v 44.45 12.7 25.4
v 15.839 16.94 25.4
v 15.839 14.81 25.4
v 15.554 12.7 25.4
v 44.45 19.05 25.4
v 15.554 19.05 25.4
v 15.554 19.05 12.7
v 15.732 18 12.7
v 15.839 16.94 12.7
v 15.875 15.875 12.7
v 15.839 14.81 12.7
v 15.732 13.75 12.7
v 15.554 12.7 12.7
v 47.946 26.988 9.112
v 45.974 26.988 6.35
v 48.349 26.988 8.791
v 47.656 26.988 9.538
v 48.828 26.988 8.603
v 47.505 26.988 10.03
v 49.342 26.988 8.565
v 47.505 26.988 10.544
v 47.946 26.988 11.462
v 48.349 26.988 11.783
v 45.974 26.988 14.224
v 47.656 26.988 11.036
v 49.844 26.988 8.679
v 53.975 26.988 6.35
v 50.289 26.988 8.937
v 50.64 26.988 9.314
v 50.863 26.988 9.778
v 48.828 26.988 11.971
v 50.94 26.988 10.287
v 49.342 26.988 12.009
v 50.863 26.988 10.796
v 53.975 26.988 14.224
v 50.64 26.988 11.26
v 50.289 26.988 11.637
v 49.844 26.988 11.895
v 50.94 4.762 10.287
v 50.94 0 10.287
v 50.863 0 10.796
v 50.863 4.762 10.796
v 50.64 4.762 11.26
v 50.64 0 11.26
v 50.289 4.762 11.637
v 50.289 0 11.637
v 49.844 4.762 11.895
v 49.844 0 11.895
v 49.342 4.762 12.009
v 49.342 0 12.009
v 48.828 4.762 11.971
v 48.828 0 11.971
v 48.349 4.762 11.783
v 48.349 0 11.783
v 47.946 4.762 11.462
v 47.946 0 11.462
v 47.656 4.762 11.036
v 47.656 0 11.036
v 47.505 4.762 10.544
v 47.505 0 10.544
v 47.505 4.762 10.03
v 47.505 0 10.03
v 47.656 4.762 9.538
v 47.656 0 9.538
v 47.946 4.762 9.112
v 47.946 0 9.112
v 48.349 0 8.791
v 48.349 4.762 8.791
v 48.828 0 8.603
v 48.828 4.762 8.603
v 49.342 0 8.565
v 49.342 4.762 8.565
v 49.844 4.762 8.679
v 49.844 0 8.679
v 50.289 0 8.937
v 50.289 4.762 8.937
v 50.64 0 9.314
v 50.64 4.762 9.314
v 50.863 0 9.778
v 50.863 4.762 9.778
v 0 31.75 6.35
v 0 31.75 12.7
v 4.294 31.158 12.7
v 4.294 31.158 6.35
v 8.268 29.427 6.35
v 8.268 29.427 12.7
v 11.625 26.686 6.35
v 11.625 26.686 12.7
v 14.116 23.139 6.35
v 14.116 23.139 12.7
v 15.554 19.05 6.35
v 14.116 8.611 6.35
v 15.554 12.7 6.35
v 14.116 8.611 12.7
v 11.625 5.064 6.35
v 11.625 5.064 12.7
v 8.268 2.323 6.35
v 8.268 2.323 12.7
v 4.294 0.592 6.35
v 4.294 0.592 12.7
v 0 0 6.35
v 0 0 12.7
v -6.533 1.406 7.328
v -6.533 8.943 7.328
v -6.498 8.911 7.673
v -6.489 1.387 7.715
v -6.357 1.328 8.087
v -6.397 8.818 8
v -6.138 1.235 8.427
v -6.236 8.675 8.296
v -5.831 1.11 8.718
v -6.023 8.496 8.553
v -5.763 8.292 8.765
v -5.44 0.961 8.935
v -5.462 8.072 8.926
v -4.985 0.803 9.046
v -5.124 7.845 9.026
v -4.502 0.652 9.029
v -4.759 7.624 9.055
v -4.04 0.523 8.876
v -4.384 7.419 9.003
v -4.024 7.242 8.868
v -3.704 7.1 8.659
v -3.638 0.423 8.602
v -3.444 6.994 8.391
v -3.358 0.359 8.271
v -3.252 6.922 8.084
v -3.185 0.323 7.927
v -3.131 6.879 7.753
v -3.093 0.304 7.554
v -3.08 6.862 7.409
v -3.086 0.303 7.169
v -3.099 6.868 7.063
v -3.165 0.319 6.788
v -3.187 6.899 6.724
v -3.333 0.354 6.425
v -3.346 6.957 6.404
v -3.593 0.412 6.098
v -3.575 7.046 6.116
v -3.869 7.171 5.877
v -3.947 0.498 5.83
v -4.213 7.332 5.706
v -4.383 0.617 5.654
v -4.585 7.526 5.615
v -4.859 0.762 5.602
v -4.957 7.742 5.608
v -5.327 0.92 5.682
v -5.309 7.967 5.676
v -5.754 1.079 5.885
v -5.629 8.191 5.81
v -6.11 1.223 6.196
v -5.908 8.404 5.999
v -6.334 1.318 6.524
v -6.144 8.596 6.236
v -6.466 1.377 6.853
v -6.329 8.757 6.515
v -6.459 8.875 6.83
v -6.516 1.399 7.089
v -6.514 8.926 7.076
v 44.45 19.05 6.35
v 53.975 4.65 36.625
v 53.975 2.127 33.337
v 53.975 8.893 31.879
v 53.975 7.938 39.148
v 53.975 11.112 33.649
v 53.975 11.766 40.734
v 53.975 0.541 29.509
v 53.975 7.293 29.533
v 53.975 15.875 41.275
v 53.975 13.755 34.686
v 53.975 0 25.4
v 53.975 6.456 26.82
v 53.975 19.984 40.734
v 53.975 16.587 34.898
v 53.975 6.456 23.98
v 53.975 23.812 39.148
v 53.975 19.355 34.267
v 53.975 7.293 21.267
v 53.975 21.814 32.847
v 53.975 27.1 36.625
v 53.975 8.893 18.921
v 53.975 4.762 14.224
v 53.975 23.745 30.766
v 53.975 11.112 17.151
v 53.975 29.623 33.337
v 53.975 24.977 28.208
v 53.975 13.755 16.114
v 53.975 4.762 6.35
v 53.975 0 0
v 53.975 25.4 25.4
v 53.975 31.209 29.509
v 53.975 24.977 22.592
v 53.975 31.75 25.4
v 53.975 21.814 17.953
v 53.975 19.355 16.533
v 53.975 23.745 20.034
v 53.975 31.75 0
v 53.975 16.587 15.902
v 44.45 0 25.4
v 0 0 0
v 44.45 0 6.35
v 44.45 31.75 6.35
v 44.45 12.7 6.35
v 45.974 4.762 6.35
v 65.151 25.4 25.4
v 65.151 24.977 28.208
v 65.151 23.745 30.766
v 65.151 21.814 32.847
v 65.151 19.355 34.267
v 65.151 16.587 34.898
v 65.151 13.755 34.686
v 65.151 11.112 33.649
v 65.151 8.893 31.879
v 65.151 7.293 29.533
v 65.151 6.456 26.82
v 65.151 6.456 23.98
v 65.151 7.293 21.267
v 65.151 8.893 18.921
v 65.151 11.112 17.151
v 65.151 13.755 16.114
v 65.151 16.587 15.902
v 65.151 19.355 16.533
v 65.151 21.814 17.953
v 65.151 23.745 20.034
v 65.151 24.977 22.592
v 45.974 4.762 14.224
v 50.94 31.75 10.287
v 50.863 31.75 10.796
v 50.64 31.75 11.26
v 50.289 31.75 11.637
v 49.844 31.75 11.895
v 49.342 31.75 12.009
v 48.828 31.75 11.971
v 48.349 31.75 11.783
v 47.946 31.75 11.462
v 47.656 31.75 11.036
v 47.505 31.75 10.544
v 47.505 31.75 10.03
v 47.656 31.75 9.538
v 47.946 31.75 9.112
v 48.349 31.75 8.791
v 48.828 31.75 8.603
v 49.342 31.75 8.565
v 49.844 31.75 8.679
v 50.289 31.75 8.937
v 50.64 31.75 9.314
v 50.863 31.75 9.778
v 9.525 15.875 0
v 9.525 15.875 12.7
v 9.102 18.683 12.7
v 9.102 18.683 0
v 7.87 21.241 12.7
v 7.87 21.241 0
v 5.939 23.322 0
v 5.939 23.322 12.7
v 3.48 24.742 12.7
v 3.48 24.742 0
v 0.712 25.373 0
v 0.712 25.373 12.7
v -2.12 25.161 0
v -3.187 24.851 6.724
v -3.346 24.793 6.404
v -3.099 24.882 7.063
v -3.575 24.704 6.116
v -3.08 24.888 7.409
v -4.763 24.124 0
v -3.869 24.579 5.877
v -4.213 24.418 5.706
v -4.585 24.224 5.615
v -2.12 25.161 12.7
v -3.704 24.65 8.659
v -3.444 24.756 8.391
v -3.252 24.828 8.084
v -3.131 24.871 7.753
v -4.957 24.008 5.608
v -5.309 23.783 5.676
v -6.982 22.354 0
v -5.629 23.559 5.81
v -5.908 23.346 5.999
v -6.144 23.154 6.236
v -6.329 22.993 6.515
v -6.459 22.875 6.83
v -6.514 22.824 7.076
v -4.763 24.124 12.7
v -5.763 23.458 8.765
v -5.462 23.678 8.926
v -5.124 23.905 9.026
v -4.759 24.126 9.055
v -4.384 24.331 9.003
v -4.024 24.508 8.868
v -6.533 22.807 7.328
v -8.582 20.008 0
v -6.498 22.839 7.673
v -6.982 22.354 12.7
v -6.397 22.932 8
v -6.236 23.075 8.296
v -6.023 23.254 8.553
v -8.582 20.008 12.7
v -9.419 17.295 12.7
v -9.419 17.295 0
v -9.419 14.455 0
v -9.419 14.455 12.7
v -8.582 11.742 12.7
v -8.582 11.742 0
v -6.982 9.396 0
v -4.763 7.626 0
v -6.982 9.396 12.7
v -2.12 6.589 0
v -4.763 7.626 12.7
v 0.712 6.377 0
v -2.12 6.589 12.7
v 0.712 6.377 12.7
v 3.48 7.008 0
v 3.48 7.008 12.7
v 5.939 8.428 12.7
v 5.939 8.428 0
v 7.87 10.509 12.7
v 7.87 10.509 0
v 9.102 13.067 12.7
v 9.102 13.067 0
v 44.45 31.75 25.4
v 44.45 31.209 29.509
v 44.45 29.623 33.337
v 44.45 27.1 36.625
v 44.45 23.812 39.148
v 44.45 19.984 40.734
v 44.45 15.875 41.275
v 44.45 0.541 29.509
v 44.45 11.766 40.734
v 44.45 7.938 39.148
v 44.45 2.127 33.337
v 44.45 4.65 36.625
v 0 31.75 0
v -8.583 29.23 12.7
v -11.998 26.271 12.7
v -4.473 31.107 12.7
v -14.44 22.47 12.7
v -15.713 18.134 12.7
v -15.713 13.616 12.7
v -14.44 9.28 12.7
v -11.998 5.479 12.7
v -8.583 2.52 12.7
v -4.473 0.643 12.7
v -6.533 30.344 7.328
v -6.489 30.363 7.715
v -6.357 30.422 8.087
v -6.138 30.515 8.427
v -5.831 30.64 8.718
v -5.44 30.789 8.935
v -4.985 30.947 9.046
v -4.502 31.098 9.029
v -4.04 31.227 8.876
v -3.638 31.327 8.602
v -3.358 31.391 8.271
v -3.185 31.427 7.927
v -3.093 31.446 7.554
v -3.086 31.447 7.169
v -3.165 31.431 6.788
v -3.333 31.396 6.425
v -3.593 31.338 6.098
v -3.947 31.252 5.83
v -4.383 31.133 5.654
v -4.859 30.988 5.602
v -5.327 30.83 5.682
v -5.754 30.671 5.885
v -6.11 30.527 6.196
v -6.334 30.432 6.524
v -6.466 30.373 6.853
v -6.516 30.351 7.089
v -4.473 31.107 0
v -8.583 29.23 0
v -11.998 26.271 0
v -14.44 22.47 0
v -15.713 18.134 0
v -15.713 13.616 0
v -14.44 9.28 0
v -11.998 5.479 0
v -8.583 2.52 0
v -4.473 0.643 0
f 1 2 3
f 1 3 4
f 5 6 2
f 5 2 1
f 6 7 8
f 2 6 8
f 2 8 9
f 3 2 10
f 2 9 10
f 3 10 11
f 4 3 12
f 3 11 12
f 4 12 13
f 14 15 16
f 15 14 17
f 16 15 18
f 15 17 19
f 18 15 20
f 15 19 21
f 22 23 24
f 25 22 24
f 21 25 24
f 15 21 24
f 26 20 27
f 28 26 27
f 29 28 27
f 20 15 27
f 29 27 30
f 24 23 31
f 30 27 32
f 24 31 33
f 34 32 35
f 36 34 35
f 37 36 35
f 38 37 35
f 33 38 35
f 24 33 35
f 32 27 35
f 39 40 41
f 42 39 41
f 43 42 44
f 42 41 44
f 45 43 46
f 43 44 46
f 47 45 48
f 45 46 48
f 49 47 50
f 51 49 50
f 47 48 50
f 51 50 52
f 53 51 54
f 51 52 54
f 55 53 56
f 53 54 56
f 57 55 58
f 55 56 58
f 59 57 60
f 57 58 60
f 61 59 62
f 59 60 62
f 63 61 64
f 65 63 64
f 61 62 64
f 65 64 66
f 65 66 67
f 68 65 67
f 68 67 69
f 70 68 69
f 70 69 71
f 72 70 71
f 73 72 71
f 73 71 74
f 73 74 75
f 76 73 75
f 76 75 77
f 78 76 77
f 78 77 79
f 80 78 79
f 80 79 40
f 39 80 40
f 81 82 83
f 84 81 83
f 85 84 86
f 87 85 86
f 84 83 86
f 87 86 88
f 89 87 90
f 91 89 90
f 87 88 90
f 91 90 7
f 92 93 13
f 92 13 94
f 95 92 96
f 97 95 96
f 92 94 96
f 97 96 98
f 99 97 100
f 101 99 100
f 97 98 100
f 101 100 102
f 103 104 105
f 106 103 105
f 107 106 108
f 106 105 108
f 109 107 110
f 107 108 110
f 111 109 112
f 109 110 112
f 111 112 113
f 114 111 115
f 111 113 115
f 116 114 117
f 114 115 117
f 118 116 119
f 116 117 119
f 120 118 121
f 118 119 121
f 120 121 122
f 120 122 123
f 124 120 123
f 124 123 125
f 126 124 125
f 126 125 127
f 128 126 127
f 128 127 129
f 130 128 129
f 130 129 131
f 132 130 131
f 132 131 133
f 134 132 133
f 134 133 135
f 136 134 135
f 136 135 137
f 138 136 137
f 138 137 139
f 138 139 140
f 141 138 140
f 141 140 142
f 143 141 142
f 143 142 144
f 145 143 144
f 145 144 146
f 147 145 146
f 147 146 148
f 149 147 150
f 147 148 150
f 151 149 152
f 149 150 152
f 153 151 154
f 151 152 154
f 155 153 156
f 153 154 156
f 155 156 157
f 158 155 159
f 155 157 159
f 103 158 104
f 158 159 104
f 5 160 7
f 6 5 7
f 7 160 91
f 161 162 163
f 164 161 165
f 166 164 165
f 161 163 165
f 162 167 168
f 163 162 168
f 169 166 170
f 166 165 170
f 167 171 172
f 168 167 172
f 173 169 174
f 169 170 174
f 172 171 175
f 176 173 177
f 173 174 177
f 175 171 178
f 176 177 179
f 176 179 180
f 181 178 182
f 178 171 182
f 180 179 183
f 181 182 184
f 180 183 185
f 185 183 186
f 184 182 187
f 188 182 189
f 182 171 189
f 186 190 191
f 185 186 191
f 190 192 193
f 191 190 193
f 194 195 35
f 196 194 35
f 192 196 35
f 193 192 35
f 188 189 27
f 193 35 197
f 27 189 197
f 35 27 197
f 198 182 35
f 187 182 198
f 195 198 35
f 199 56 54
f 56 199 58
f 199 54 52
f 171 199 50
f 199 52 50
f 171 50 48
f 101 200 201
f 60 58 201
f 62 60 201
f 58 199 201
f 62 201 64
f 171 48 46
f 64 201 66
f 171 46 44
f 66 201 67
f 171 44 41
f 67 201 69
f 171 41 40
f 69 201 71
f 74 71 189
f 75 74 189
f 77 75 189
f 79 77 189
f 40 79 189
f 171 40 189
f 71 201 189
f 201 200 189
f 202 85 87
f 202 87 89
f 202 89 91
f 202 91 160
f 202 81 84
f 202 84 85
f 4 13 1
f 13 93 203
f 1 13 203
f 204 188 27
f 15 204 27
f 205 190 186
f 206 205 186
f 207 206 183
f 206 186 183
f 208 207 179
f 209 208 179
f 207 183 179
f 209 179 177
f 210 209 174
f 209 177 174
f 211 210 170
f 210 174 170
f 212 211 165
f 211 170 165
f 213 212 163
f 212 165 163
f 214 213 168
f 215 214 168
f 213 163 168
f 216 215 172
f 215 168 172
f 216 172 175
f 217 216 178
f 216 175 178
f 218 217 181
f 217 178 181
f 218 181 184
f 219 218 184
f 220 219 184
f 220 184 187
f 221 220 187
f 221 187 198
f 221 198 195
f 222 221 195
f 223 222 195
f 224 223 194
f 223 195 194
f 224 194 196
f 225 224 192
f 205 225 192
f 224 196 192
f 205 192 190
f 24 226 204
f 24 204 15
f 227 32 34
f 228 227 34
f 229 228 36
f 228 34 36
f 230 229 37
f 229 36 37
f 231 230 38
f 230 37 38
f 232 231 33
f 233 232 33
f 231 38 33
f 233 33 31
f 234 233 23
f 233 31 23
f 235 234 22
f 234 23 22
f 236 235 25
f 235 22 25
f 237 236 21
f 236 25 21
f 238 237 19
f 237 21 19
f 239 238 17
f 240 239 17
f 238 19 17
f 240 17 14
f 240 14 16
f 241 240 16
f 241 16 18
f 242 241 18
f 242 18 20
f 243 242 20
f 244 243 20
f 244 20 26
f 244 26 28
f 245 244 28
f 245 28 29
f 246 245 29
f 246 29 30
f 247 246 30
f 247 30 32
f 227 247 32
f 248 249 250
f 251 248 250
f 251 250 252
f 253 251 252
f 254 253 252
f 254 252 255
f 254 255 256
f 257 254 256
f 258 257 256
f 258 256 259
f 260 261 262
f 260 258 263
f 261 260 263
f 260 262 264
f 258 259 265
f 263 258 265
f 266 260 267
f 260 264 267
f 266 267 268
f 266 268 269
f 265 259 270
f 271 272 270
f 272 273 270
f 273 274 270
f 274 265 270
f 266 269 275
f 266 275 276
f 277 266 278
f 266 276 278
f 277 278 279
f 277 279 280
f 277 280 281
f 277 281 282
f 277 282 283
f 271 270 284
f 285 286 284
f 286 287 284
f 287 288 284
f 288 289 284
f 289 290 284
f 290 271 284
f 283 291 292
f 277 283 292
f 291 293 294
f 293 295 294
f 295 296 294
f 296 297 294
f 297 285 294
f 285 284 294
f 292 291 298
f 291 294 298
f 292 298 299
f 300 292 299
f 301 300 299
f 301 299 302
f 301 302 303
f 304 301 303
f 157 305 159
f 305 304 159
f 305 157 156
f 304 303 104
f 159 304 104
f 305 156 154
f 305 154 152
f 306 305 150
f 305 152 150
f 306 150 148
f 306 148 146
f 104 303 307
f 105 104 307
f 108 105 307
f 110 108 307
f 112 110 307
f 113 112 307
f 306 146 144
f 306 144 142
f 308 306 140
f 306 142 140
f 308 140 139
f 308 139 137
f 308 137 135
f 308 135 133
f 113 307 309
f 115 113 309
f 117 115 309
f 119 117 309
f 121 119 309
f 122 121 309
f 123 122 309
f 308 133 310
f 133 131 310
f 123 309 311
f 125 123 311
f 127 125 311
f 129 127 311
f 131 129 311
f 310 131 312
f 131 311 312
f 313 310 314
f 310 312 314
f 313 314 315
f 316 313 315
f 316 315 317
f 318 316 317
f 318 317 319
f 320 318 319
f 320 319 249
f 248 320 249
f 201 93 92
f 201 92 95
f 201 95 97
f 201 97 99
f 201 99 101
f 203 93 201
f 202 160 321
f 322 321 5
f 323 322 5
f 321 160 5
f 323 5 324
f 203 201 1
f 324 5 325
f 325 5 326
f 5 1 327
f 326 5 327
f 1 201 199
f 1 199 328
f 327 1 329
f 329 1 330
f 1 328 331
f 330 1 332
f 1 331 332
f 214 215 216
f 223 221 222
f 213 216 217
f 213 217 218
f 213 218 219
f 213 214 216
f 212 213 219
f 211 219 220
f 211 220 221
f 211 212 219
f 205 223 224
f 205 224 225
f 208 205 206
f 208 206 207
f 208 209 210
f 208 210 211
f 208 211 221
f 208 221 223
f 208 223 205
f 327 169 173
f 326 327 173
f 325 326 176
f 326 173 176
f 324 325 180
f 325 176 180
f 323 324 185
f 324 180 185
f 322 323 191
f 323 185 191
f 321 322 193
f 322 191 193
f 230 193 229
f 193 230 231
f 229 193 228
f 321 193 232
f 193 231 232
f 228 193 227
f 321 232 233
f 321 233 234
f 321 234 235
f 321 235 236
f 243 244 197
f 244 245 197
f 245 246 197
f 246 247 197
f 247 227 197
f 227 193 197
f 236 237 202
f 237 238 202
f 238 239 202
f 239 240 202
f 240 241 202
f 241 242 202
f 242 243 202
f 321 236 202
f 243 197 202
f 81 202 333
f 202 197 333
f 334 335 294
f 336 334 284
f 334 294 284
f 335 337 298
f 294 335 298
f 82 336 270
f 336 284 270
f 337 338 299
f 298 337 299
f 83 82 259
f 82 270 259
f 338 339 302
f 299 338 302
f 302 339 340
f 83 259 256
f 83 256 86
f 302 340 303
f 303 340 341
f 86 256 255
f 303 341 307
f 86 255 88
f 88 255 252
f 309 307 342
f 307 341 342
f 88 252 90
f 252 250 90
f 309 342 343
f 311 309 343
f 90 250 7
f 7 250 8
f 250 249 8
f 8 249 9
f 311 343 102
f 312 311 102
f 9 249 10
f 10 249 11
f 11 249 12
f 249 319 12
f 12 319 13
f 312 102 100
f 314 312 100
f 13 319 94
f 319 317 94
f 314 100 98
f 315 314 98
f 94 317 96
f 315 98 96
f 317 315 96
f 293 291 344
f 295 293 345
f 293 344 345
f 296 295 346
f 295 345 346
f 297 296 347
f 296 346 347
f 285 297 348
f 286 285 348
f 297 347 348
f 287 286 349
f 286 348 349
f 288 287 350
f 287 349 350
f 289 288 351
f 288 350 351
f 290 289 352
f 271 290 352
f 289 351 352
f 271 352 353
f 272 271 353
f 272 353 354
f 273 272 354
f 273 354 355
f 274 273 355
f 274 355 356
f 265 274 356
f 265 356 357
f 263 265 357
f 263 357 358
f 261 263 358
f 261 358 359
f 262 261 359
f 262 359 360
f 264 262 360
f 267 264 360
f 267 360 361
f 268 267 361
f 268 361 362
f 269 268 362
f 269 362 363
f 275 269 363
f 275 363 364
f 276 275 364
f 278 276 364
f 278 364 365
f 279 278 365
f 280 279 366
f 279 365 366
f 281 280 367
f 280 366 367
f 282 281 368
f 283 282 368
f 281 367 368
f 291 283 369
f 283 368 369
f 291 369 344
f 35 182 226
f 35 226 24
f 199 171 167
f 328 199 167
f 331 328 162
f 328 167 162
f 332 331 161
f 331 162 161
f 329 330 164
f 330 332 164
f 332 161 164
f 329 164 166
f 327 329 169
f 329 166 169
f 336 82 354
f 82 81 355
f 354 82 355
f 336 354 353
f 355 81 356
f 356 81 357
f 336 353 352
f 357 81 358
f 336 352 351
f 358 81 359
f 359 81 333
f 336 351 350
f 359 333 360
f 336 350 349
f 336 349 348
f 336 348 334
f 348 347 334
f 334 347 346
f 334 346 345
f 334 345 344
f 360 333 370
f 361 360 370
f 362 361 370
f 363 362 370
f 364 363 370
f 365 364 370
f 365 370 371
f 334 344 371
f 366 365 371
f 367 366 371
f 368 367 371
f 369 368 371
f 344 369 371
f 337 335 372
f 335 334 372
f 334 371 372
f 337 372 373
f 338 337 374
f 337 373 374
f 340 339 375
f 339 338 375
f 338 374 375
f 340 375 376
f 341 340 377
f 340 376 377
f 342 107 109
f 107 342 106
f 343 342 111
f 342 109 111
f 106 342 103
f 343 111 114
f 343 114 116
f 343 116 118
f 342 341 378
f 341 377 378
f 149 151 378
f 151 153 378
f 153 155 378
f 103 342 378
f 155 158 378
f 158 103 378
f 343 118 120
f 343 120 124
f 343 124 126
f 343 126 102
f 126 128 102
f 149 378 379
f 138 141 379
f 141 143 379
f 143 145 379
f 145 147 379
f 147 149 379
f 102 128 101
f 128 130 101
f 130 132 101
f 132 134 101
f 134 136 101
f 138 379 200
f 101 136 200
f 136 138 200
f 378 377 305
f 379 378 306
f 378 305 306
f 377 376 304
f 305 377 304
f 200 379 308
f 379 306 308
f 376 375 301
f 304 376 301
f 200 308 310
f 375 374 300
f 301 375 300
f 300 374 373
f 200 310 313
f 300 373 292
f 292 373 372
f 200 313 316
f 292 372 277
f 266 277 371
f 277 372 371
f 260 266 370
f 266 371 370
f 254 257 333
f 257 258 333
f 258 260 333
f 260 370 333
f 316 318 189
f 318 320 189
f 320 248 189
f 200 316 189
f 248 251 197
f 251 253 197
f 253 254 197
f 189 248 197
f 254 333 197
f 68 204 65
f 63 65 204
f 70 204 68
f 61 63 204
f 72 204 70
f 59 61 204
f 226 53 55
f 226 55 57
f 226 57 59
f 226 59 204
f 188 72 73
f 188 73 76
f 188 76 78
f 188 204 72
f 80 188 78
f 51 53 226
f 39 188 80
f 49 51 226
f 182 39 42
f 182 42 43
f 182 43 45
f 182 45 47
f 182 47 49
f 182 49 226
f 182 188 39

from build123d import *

# Parameters (mm, degrees)
F1_DEPTH  = 41.275
F3_DEPTH  = 31.751
F5_DEPTH  = 69.851
F6_W      = 22.225
F6_H      = 7.874
F7_DEPTH  = 8.001
F8_R      = 9.525
F9_DEPTH  = 11.176
F10_R     = 1.7272
F11_DEPTH = 31.751
F13_DEPTH = 6.35
F14_R     = 9.525
F15_DEPTH = 12.701
F17_DEPTH = 25.4
F18_R     = 1.7272
F19_DEPTH = 31.751


with BuildPart() as f1:
    # F0 (on Top) → F1 (new body)
    with BuildSketch(Plane.XY):
        with BuildLine():
            ThreePointArc((0, 31.75), (-15.875, 15.875), (0, 0))
            Line((0, 0), (53.975, 0))
            Line((53.975, 0), (53.975, 31.75))
            Line((53.975, 31.75), (0, 31.75))
        make_face()
    extrude(amount=F1_DEPTH)

    # F2 (on face) → F3 (cut, through all)
    with BuildSketch(Plane.XZ):
        Polygon((44.45, 6.35), (44.45, 41.275), (-15.875, 41.275), (-15.875, 12.7), (15.875, 12.7), (15.875, 6.35), align=None)
    extrude(amount=-F3_DEPTH, mode=Mode.SUBTRACT)

    # F4 (on face) → F5 (cut, through all)
    with BuildSketch(Plane.YZ.offset(53.975)):
        with BuildLine():
            ThreePointArc((0, 25.4), (4.6496798487, 36.6253201513), (15.875, 41.275))
            Line((15.875, 41.275), (0, 41.275))
            Line((0, 41.275), (0, 25.4))
        make_face()
        with BuildLine():
            ThreePointArc((15.875, 41.275), (27.1003201513, 36.6253201513), (31.75, 25.4))
            Line((31.75, 25.4), (31.75, 41.275))
            Line((31.75, 41.275), (15.875, 41.275))
        make_face()
    extrude(amount=-F5_DEPTH, mode=Mode.SUBTRACT)

    # F6 (on face) → F7 (cut)
    with BuildSketch(Plane.YZ.offset(53.975)):
        with Locations((15.875, 10.287)):
            Rectangle(F6_W, F6_H)
    extrude(amount=-F7_DEPTH, mode=Mode.SUBTRACT)

    # F8 (on face) → F9 (join)
    with BuildSketch(Plane.YZ.offset(53.975)):
        with Locations((15.875, 25.4)):
            Circle(F8_R)
    extrude(amount=F9_DEPTH)

    # F10 (on face) → F11 (cut, through all)
    with BuildSketch(Plane.XZ):
        with Locations((49.2125, 10.287)):
            Circle(F10_R)
    extrude(amount=-F11_DEPTH, mode=Mode.SUBTRACT)

    # F12 (on face) → F13 (cut)
    with BuildSketch(Plane.XY.offset(12.7)):
        with BuildLine():
            ThreePointArc((0, 31.75), (11.2253201513, 27.1003201513), (15.875, 15.875))
            Line((15.875, 15.875), (15.875, 31.75))
            Line((15.875, 31.75), (0, 31.75))
        make_face()
        with BuildLine():
            Line((15.875, 0), (15.875, 15.875))
            ThreePointArc((15.875, 15.875), (11.2253201513, 4.6496798487), (0, 0))
            Line((0, 0), (15.875, 0))
        make_face()
    extrude(amount=-F13_DEPTH, mode=Mode.SUBTRACT)

    # F14 (on face) → F15 (cut, through all)
    with BuildSketch(Plane.XY.offset(12.7)):
        with Locations((0, 15.875)):
            Circle(F14_R)
    extrude(amount=-F15_DEPTH, mode=Mode.SUBTRACT)

    # F16 (on Top) → F17 (join)
    with BuildSketch(Plane.XY):
        with BuildLine():
            Line((44.45, 19.05), (15.5542598667, 19.05))
            ThreePointArc((15.5542598667, 19.05), (15.875, 15.875), (15.5542598667, 12.7))
            Line((15.5542598667, 12.7), (44.45, 12.7))
            Line((44.45, 12.7), (44.45, 19.05))
        make_face()
    extrude(amount=F17_DEPTH)

    # F18 (on face) → F19 (cut, through all)
    with BuildSketch(Plane(origin=(0, 31.75, 0), x_dir=(-1, 0, 0), z_dir=(0, 1, 0))):
        with Locations((4.8054051585, 7.3282429948)):
            Circle(F18_R)
    extrude(amount=-F19_DEPTH, mode=Mode.SUBTRACT)


solid = f1.part
